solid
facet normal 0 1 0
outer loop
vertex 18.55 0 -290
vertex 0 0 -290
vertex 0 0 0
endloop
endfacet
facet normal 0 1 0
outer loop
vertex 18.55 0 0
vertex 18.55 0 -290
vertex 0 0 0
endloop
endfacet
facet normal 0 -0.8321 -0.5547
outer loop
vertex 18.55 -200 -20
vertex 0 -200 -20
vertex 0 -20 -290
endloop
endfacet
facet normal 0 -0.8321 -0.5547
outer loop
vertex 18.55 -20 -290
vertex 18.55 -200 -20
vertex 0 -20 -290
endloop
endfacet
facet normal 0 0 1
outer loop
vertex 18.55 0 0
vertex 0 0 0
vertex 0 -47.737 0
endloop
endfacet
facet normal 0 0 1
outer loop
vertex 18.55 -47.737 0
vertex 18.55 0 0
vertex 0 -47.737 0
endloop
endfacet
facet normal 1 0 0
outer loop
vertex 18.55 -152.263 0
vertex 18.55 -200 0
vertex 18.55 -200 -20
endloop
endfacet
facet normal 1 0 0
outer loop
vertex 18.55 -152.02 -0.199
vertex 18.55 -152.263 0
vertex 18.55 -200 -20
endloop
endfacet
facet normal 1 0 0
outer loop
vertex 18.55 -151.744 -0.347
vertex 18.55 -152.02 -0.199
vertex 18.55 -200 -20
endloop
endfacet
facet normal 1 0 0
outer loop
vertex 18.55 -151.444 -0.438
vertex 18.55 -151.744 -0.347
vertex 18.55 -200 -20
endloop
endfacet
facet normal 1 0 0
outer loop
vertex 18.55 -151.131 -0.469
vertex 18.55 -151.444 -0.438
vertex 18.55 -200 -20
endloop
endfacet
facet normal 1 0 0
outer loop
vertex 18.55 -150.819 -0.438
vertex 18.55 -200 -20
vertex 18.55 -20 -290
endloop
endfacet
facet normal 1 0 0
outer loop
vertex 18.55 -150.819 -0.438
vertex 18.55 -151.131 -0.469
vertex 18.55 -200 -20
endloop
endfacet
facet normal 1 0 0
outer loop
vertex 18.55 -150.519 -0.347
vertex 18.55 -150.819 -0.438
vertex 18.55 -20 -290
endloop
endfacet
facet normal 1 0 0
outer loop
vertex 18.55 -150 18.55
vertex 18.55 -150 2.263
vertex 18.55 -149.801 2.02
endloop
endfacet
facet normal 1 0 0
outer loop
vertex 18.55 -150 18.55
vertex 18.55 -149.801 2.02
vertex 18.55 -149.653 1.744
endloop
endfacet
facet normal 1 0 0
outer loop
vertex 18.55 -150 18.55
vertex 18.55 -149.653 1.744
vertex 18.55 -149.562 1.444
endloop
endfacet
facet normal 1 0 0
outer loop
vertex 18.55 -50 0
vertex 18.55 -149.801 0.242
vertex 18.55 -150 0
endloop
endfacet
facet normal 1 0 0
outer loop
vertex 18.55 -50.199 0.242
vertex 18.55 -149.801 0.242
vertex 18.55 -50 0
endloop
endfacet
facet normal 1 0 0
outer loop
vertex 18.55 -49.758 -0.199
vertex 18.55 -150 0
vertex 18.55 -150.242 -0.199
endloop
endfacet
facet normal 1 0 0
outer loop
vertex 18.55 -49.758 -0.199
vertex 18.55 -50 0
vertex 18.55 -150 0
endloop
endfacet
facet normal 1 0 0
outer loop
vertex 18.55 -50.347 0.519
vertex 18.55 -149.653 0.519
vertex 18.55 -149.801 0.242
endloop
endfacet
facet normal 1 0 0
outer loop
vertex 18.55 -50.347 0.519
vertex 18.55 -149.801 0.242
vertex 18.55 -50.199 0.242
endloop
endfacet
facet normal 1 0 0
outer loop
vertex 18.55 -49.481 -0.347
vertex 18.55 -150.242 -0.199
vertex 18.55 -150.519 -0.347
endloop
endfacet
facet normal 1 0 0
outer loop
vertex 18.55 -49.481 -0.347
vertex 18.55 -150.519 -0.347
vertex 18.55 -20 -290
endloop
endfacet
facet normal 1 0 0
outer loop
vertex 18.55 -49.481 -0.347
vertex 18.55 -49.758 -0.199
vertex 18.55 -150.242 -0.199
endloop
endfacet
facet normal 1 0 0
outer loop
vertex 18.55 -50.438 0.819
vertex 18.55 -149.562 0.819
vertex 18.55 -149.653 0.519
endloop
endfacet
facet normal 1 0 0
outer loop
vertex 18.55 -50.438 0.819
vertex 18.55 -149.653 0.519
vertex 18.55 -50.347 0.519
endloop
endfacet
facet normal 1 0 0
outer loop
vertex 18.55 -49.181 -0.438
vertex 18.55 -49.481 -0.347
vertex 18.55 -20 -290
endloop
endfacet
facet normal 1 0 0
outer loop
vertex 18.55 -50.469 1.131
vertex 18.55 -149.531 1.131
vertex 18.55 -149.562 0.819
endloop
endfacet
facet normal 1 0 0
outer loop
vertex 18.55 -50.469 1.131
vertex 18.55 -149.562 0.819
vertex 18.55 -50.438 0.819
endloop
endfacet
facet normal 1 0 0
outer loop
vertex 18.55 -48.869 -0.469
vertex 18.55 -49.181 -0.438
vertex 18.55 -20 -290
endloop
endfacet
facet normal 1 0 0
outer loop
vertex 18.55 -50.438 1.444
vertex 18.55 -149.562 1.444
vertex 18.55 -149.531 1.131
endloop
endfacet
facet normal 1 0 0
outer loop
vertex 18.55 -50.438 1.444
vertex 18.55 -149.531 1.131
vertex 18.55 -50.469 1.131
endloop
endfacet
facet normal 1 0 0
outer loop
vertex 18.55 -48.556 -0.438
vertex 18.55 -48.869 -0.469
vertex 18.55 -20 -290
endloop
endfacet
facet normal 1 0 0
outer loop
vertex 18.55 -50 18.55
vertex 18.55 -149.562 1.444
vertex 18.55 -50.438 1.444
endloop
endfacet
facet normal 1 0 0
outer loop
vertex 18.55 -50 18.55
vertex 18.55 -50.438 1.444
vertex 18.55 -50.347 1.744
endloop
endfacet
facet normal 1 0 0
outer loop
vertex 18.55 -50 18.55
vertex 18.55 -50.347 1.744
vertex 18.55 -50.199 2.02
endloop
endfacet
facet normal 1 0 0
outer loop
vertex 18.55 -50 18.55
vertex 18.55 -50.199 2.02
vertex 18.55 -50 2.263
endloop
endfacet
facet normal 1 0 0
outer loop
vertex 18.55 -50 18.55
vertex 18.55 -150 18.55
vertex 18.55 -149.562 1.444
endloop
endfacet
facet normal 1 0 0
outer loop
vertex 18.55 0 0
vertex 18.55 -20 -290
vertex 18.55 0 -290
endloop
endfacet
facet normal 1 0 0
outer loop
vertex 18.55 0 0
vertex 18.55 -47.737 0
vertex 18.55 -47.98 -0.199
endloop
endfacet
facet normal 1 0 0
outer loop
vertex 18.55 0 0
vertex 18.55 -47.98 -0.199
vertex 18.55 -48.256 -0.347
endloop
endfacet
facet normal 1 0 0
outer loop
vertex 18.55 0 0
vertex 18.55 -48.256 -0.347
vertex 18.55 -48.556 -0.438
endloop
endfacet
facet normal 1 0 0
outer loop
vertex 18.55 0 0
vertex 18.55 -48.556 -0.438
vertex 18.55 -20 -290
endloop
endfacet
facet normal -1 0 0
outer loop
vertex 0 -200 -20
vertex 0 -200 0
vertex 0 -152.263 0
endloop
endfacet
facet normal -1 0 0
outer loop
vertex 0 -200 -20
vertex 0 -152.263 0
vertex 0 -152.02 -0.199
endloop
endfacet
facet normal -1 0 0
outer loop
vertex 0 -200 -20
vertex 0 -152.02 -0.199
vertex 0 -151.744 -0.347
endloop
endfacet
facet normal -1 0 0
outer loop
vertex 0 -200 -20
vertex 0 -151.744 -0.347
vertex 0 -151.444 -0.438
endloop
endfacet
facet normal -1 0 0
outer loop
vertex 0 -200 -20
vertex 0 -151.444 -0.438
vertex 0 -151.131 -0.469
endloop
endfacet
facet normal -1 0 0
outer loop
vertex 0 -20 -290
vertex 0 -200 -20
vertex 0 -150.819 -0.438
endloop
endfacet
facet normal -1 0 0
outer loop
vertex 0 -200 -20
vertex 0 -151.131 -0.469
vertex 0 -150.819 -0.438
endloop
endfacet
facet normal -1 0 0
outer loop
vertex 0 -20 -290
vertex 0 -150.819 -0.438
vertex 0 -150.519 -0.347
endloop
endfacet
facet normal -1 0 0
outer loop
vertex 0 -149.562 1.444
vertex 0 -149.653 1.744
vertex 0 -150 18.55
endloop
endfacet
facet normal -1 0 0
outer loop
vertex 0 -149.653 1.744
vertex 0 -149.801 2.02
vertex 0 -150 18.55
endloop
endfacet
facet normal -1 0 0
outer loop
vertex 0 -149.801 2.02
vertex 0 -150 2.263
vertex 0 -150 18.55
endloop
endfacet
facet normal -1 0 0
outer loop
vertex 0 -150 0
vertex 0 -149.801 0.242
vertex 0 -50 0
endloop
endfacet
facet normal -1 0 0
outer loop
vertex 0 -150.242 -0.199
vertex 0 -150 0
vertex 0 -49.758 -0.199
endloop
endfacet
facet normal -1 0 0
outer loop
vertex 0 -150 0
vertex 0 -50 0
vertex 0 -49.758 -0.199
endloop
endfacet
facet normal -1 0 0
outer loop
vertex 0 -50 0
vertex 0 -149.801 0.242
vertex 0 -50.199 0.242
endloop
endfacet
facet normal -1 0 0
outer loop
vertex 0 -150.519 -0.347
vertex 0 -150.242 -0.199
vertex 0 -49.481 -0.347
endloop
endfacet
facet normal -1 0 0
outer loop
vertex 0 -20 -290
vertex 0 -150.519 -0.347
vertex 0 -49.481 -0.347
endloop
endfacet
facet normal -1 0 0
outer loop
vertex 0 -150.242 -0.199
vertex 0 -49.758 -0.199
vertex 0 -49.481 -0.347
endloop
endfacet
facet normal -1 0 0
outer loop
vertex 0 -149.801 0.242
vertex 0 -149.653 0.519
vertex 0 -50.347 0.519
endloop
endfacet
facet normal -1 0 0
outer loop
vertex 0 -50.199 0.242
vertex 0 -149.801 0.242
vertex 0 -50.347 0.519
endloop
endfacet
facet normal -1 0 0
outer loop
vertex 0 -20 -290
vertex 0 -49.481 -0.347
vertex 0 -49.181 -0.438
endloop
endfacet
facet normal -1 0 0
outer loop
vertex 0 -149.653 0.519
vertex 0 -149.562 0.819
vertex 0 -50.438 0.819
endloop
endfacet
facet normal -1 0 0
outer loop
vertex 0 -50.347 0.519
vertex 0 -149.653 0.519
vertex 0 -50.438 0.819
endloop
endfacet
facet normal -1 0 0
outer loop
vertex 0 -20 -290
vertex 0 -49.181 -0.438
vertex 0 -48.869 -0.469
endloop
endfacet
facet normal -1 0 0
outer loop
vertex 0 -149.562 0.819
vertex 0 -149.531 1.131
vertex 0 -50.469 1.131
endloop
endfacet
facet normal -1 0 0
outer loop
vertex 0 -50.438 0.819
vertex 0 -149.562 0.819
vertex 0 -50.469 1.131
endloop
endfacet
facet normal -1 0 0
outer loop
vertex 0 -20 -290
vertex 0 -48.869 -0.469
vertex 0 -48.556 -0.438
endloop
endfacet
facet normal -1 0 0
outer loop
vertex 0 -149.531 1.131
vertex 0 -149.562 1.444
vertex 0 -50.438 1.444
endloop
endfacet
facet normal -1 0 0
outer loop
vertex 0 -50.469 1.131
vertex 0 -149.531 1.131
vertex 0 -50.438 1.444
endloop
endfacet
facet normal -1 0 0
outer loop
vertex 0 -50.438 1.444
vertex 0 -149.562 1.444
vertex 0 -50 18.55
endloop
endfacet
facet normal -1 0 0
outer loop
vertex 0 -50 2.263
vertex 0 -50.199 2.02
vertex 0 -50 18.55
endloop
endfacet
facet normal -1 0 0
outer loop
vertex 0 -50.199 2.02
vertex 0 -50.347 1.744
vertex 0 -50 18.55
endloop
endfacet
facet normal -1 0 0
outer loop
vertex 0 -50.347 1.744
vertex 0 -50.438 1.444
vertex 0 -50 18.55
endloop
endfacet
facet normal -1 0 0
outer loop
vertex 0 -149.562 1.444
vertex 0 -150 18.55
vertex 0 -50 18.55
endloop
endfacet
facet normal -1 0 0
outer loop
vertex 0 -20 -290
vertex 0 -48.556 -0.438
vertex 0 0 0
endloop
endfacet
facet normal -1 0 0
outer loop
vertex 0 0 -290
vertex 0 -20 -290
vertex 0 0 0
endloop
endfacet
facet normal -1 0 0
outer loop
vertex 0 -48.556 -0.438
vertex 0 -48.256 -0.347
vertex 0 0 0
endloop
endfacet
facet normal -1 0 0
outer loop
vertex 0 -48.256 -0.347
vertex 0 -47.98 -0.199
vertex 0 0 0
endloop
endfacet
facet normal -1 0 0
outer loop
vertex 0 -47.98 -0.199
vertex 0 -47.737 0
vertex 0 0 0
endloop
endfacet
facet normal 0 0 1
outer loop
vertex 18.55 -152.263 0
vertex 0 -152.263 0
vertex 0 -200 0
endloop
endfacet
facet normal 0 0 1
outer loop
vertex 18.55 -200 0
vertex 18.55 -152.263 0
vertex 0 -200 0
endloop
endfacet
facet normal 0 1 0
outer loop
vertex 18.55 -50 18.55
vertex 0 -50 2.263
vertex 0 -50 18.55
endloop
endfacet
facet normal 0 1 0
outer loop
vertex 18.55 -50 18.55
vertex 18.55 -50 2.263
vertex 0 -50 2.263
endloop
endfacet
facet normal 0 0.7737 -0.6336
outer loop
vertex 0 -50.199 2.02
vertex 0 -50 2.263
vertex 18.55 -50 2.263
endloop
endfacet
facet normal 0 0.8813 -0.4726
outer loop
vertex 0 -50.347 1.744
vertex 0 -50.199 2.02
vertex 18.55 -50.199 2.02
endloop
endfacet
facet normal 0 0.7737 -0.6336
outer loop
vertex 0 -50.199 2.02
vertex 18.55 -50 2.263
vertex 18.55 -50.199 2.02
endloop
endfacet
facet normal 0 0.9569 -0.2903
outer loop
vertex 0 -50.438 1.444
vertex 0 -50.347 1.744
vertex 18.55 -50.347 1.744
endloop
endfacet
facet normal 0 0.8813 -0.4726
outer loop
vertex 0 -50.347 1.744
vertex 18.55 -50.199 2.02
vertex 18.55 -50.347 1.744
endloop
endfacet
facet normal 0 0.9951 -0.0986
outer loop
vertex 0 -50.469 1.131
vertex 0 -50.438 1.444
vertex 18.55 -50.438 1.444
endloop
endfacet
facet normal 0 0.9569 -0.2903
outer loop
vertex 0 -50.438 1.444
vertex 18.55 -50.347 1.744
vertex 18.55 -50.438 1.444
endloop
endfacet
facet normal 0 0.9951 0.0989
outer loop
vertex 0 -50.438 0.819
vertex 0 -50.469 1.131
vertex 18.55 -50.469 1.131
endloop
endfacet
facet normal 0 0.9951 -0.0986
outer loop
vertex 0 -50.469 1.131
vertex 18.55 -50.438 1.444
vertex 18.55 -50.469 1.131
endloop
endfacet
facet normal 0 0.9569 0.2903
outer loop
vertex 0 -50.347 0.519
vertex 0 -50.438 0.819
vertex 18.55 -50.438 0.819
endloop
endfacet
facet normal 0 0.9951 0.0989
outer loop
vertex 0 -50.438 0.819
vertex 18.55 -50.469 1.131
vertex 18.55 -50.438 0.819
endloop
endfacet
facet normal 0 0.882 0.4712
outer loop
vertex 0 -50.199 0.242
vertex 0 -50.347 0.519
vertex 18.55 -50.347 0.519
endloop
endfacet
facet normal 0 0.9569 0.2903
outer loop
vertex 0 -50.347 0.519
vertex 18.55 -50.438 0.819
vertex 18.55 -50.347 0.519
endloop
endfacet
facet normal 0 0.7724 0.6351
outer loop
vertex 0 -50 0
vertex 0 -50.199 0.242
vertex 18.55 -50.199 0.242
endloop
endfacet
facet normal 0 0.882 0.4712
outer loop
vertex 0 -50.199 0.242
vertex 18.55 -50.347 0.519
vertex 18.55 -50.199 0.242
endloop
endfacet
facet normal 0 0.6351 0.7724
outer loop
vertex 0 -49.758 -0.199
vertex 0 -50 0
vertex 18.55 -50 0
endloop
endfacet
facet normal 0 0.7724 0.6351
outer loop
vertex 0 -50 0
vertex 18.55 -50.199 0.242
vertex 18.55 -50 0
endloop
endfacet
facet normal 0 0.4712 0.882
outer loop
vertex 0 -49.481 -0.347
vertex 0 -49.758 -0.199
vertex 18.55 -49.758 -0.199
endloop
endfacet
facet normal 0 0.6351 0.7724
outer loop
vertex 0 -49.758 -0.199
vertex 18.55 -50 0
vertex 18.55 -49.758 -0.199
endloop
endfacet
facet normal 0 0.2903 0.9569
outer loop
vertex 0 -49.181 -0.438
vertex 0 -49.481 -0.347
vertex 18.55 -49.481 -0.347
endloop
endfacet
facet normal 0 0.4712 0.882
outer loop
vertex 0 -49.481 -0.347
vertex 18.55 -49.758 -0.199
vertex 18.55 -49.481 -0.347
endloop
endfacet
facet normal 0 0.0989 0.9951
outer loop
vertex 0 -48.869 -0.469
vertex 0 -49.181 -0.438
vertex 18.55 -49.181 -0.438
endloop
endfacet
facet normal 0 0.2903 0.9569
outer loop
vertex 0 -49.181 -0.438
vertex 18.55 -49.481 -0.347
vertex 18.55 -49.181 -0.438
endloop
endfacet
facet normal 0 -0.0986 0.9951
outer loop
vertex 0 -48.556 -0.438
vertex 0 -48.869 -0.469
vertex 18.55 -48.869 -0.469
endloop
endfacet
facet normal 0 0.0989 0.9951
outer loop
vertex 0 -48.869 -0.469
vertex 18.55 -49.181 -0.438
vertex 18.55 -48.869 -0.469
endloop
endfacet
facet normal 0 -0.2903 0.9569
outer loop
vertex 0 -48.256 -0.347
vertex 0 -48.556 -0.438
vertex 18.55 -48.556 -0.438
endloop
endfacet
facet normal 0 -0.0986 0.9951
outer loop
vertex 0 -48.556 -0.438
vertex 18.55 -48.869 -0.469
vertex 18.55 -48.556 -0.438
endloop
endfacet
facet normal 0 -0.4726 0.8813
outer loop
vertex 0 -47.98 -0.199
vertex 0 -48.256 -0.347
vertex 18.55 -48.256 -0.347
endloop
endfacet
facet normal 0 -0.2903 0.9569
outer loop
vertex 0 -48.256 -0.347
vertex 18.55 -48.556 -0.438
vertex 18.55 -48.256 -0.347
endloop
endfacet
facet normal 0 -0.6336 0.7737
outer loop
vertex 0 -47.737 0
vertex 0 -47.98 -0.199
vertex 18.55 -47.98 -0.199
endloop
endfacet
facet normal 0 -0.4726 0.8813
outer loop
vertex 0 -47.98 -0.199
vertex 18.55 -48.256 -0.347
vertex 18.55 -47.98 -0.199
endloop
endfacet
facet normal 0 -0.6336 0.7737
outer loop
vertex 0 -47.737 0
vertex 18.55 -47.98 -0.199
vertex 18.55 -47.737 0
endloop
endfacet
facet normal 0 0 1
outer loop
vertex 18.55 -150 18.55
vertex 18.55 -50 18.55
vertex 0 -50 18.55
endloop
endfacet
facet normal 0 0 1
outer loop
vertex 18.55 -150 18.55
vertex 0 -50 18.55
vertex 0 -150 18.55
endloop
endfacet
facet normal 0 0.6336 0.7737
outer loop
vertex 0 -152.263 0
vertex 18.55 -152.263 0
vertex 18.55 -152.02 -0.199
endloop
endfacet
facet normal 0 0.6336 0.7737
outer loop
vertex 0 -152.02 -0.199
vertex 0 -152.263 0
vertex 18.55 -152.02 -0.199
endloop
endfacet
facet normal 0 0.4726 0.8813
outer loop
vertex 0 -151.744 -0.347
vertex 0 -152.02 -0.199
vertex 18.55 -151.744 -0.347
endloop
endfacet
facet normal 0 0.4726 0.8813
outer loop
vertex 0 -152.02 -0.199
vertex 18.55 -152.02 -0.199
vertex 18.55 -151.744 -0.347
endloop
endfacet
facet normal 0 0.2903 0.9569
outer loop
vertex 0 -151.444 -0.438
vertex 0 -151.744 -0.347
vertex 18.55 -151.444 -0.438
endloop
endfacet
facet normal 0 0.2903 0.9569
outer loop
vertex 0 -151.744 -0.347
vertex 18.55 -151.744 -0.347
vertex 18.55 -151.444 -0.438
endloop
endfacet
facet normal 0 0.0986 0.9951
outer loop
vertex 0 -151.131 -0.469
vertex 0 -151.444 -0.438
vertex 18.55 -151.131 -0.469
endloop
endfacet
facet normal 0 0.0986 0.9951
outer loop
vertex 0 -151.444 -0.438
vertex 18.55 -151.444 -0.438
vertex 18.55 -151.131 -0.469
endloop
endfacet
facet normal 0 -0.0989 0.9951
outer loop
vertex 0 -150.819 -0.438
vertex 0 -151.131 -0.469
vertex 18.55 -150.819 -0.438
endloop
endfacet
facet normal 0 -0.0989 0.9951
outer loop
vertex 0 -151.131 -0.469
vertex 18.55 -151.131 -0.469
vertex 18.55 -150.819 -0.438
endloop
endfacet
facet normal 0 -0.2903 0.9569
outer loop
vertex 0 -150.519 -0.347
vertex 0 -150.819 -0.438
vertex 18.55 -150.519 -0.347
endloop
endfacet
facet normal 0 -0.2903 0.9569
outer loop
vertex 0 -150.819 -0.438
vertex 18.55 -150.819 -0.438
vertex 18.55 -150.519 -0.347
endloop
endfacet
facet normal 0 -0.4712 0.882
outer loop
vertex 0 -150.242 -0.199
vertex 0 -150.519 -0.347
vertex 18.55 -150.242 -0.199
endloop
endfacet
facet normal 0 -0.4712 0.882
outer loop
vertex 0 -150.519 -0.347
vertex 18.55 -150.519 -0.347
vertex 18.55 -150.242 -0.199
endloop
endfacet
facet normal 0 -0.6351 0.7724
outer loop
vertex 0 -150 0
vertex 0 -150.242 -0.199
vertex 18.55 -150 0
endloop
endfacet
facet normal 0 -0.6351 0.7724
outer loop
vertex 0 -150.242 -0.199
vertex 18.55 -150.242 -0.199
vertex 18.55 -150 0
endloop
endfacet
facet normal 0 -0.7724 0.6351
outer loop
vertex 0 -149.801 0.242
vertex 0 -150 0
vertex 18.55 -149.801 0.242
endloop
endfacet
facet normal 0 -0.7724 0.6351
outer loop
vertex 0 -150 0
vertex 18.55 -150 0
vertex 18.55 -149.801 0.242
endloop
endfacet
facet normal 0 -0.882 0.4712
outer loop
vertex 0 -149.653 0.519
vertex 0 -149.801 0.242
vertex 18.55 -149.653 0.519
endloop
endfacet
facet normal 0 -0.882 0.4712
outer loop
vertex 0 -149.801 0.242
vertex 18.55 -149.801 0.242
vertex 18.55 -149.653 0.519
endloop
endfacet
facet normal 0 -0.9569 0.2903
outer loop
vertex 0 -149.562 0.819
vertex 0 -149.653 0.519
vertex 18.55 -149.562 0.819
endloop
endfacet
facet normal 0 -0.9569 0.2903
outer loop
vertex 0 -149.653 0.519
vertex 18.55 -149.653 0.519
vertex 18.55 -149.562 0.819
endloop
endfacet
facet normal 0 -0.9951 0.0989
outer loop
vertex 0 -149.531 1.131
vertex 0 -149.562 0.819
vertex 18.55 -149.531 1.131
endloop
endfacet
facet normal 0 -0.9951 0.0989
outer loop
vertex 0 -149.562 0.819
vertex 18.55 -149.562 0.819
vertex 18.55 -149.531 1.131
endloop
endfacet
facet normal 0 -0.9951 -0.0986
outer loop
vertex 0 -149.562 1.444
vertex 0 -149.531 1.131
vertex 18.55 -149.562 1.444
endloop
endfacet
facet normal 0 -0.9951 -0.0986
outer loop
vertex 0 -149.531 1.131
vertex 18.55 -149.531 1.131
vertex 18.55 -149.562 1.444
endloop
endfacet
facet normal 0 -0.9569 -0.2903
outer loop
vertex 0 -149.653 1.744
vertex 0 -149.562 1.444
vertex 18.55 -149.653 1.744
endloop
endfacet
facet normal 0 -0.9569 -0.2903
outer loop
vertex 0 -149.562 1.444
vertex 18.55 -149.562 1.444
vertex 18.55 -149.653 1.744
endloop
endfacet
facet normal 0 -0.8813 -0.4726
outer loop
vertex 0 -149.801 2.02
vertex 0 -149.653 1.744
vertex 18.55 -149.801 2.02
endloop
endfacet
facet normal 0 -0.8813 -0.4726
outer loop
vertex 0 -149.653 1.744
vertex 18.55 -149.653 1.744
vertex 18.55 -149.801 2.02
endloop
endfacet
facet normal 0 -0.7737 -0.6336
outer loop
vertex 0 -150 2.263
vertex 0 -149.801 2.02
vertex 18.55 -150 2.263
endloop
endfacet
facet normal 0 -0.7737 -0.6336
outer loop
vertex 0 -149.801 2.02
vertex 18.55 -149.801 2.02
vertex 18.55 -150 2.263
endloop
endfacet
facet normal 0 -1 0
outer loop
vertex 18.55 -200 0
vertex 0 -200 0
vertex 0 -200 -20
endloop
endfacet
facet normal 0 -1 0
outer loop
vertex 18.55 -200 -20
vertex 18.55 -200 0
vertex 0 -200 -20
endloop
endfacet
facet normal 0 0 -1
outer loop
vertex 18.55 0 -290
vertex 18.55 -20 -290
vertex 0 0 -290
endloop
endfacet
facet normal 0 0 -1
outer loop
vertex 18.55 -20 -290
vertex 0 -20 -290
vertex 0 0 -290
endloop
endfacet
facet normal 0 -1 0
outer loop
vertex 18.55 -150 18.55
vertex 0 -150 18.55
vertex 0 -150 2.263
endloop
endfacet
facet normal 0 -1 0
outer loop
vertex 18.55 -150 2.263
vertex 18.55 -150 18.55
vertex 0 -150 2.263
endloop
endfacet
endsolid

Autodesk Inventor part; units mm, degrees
ref_plane "YZ Plane" through (0, 0, 0) normal (1, 0, 0) x (0, 1, 0)
ref_plane "XZ Plane" through (0, 0, 0) normal (0, 1, 0) x (-1, 0, 0)
ref_plane "XY Plane" through (0, 0, 0) normal (0, 0, 1) x (1, 0, 0)
sketch "Esquisse1" plane through (0, 0, 0) normal (1, 0, 0) x (0, 1, 0)
  line L0 (0, 0) -> (-200, 0)
  line L1 (-200, 0) -> (-200, -20)
  line L2 (-200, -20) -> (-20, -290)
  line L3 (-20, -290) -> (0, -290)
  line L4 (0, -290) -> (0, 0)
  dimension "d0" = 200
  dimension "d1" = 20
  dimension "d2" = 20
  dimension "d3" = 290
extrude "Extrusion1" add sketch "Esquisse1" along normal blind 18.55
sketch "Esquisse2" plane through (18.55, 0, 0) normal (1, 0, 0) x (0, 0, -1)
  line L0 (0, 0) -> (0, -200) projected
  line L1 (0, -50) -> (-18.55, -50)
  line L2 (-18.55, -50) -> (-18.55, -150)
  line L3 (-18.55, -150) -> (0, -150)
  line L4 (0, -150) -> (0, -50)
  line L5 (290, 0) -> (0, 0) projected
  point P0 (0, -150)
  dimension "d6" = 18.55
  dimension "d7" = 50
  dimension "d8" = 100
extrude "Extrusion2" add sketch "Esquisse2" against normal blind 18.55
sketch "Esquisse3" plane through (18.55, 0, 0) normal (1, 0, 0) x (0, 0, -1)
  circle A0 centre (-1.1314, -48.8686) radius 1.6
  line L0 (-1.1314, -48.8686) -> (0, -50) construction
  line L1 (0, -50) -> (-18.55, -50) projected
  circle A1 centre (-1.1314, -151.1314) radius 1.6
  point P0 (0, 0)
  point P1 (0, -150)
  dimension "d12" = 3.2
  dimension "d11" = 45
extrude "Extrusion3" cut sketch "Esquisse3" against normal blind 18.55
properties part number "Bracket"
